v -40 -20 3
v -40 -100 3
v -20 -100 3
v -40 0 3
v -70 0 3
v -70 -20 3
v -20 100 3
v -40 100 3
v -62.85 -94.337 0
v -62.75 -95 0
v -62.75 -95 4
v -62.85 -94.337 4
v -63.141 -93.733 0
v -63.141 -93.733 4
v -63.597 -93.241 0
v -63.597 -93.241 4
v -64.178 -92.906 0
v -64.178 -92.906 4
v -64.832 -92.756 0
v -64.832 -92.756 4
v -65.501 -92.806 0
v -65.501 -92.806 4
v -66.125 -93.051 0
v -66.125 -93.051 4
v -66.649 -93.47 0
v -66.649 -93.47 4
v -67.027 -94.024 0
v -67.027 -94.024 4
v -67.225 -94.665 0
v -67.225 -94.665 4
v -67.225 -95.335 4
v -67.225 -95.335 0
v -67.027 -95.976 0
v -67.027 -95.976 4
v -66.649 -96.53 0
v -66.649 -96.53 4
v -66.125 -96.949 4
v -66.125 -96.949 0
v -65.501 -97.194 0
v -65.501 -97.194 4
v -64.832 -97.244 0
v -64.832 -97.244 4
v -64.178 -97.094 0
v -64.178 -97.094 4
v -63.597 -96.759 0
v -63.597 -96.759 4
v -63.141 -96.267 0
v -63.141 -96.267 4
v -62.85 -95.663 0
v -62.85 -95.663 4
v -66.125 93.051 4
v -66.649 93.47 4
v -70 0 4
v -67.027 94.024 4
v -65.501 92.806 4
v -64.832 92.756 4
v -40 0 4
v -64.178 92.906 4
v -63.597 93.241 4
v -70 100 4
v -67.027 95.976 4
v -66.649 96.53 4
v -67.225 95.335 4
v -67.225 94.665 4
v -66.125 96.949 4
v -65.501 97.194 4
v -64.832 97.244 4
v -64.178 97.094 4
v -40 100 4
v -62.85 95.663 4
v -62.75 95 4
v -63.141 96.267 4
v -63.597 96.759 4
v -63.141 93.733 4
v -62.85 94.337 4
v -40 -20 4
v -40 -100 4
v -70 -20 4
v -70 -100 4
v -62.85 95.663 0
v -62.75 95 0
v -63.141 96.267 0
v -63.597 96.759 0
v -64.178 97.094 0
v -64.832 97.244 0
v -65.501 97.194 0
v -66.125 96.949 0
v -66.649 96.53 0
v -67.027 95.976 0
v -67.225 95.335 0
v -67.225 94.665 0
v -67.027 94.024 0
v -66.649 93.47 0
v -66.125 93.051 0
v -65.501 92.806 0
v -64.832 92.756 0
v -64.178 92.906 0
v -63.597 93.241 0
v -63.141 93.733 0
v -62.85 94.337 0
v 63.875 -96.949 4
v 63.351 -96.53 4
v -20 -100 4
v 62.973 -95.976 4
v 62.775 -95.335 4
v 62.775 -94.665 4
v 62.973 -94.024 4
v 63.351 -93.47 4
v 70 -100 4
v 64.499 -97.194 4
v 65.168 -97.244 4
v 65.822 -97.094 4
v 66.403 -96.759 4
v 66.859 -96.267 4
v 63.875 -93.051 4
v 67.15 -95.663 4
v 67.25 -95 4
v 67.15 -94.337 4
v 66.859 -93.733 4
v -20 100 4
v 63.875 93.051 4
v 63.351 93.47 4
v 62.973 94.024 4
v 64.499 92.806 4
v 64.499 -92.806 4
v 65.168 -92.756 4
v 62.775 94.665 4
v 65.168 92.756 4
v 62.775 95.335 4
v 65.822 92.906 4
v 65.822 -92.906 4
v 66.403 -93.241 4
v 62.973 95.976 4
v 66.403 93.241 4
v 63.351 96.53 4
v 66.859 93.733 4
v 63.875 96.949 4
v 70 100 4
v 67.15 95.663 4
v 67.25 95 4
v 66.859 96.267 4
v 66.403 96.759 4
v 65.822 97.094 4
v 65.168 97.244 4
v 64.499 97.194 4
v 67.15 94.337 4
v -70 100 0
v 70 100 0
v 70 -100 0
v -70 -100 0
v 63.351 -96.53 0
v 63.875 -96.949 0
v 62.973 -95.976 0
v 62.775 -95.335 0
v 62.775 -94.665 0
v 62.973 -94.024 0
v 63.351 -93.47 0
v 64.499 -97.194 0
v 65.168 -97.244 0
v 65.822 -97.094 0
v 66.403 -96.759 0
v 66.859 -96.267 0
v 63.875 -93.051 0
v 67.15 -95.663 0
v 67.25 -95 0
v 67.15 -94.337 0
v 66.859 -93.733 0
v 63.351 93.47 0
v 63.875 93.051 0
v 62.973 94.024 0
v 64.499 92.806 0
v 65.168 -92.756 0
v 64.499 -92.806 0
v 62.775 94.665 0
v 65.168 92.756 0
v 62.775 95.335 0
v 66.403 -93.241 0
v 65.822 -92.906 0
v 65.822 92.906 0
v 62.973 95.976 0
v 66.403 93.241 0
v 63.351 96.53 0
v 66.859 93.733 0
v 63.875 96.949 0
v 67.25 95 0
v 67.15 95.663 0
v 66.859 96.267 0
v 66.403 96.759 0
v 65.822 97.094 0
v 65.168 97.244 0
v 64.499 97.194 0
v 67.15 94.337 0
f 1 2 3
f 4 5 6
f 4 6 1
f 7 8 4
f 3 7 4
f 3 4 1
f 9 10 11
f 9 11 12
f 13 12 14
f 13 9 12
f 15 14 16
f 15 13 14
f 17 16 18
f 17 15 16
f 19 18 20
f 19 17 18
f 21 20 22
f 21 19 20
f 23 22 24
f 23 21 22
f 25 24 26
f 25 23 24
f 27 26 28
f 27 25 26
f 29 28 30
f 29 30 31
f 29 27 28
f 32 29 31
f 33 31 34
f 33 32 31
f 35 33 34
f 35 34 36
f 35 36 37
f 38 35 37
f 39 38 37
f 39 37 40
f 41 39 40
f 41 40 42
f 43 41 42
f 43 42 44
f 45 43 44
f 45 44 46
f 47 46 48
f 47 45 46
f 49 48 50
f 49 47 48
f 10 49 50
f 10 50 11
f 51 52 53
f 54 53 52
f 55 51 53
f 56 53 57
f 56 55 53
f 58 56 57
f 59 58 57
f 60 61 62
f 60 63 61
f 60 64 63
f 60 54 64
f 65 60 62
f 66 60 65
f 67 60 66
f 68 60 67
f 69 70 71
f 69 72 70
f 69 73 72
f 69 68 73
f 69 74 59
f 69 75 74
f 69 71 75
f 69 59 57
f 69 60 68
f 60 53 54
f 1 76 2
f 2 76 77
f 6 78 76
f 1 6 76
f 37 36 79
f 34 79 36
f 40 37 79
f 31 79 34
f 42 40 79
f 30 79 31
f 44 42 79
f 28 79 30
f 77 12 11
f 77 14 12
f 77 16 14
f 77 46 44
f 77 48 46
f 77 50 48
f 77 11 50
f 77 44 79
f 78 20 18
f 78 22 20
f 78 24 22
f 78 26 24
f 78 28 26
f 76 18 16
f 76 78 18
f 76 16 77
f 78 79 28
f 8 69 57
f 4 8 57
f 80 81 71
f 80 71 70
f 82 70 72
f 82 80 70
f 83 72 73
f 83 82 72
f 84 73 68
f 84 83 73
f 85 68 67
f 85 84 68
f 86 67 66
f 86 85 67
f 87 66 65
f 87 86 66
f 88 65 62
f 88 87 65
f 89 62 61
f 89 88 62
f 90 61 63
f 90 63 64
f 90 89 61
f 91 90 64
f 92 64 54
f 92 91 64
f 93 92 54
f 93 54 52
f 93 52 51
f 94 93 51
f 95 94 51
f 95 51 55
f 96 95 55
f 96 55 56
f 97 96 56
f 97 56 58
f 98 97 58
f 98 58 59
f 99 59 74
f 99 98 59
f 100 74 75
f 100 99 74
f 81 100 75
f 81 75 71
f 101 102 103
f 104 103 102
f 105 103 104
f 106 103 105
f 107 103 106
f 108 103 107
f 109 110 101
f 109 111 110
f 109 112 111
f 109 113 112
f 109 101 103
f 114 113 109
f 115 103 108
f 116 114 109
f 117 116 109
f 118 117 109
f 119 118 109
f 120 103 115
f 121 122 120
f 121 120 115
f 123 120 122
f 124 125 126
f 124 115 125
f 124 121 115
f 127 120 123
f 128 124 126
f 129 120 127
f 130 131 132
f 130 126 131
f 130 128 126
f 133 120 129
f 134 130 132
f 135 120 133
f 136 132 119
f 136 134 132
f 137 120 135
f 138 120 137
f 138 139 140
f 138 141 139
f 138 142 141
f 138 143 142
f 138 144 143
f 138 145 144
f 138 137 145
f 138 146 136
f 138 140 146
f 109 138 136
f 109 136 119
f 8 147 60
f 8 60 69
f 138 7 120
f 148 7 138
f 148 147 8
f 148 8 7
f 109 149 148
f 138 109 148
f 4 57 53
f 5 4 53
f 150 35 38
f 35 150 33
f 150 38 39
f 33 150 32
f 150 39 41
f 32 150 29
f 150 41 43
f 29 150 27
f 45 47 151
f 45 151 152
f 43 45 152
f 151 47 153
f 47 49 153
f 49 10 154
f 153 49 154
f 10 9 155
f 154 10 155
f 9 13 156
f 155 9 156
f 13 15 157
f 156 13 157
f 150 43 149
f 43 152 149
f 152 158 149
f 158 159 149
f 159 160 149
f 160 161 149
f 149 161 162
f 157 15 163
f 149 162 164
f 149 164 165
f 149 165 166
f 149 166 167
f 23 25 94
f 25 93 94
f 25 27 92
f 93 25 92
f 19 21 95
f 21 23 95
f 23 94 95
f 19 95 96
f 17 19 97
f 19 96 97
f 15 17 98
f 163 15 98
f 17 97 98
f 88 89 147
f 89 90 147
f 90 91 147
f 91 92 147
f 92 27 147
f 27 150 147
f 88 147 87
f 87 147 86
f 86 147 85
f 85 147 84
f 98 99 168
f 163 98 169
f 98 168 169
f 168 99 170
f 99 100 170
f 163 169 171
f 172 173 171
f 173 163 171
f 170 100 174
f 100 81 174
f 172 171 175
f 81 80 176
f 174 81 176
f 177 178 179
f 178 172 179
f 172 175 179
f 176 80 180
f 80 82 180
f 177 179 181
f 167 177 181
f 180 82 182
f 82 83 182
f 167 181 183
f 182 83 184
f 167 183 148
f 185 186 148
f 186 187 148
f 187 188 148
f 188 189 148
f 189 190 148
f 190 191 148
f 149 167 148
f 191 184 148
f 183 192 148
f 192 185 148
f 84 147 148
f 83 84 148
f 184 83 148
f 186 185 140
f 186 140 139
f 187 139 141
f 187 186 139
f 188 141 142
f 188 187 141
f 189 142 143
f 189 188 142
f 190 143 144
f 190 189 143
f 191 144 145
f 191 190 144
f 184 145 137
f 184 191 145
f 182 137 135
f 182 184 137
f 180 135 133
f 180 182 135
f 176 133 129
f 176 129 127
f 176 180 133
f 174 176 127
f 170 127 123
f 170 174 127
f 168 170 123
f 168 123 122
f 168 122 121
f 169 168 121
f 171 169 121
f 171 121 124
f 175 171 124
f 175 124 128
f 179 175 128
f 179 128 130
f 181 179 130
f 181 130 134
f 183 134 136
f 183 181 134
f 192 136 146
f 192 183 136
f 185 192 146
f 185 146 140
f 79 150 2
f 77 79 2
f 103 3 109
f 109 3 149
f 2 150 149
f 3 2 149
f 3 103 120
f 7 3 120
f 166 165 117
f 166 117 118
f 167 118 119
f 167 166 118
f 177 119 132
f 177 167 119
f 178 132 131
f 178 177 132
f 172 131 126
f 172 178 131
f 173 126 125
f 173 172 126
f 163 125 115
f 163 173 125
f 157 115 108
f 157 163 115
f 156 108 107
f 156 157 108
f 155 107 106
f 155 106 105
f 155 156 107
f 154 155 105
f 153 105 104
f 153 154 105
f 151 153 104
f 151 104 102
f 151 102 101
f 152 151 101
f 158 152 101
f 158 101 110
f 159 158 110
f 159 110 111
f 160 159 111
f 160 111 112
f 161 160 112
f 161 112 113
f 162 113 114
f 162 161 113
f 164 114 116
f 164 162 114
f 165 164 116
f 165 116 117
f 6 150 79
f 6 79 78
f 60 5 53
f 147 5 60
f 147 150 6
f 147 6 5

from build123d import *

# Parameters (mm, degrees)
SKETCH1_W                      = 140
SKETCH1_H                      = 200
BODY_DEPTH                     = 4
CABLE_CANAL_DEPTH              = 1
MOUNTING_SCREW_HOLES_OUTLINE_R = 2.25
MOUNTING_SCREW_HOLES_DEPTH     = 4


# Read off the part's stored shape, not the designer's step: mounting_screw_holes
with BuildPart() as part:
    # Sketch1 → body (new body)
    with BuildSketch(Plane.XY):
        Rectangle(SKETCH1_W, SKETCH1_H)
    extrude(amount=BODY_DEPTH)

    # Sketch2 → cable_canal (cut)
    with BuildSketch(Plane.XY.offset(4)):
        Polygon((-40, 100), (-40, 0), (-70, 0), (-70, -20), (-40, -20), (-40, -100), (-20, -100), (-20, 100), align=None)
    extrude(amount=-CABLE_CANAL_DEPTH, mode=Mode.SUBTRACT)

    # mounting_screw_holes outline → mounting_screw_holes (cut)
    with BuildSketch(Plane.XY):
        with Locations((65, 95)):
            Circle(MOUNTING_SCREW_HOLES_OUTLINE_R)
        with Locations((-65, -95)):
            Circle(MOUNTING_SCREW_HOLES_OUTLINE_R)
        with Locations((65, -95)):
            Circle(MOUNTING_SCREW_HOLES_OUTLINE_R)
        with Locations((-65, 95)):
            Circle(MOUNTING_SCREW_HOLES_OUTLINE_R)
    extrude(amount=MOUNTING_SCREW_HOLES_DEPTH, mode=Mode.SUBTRACT)


solid = part.part
